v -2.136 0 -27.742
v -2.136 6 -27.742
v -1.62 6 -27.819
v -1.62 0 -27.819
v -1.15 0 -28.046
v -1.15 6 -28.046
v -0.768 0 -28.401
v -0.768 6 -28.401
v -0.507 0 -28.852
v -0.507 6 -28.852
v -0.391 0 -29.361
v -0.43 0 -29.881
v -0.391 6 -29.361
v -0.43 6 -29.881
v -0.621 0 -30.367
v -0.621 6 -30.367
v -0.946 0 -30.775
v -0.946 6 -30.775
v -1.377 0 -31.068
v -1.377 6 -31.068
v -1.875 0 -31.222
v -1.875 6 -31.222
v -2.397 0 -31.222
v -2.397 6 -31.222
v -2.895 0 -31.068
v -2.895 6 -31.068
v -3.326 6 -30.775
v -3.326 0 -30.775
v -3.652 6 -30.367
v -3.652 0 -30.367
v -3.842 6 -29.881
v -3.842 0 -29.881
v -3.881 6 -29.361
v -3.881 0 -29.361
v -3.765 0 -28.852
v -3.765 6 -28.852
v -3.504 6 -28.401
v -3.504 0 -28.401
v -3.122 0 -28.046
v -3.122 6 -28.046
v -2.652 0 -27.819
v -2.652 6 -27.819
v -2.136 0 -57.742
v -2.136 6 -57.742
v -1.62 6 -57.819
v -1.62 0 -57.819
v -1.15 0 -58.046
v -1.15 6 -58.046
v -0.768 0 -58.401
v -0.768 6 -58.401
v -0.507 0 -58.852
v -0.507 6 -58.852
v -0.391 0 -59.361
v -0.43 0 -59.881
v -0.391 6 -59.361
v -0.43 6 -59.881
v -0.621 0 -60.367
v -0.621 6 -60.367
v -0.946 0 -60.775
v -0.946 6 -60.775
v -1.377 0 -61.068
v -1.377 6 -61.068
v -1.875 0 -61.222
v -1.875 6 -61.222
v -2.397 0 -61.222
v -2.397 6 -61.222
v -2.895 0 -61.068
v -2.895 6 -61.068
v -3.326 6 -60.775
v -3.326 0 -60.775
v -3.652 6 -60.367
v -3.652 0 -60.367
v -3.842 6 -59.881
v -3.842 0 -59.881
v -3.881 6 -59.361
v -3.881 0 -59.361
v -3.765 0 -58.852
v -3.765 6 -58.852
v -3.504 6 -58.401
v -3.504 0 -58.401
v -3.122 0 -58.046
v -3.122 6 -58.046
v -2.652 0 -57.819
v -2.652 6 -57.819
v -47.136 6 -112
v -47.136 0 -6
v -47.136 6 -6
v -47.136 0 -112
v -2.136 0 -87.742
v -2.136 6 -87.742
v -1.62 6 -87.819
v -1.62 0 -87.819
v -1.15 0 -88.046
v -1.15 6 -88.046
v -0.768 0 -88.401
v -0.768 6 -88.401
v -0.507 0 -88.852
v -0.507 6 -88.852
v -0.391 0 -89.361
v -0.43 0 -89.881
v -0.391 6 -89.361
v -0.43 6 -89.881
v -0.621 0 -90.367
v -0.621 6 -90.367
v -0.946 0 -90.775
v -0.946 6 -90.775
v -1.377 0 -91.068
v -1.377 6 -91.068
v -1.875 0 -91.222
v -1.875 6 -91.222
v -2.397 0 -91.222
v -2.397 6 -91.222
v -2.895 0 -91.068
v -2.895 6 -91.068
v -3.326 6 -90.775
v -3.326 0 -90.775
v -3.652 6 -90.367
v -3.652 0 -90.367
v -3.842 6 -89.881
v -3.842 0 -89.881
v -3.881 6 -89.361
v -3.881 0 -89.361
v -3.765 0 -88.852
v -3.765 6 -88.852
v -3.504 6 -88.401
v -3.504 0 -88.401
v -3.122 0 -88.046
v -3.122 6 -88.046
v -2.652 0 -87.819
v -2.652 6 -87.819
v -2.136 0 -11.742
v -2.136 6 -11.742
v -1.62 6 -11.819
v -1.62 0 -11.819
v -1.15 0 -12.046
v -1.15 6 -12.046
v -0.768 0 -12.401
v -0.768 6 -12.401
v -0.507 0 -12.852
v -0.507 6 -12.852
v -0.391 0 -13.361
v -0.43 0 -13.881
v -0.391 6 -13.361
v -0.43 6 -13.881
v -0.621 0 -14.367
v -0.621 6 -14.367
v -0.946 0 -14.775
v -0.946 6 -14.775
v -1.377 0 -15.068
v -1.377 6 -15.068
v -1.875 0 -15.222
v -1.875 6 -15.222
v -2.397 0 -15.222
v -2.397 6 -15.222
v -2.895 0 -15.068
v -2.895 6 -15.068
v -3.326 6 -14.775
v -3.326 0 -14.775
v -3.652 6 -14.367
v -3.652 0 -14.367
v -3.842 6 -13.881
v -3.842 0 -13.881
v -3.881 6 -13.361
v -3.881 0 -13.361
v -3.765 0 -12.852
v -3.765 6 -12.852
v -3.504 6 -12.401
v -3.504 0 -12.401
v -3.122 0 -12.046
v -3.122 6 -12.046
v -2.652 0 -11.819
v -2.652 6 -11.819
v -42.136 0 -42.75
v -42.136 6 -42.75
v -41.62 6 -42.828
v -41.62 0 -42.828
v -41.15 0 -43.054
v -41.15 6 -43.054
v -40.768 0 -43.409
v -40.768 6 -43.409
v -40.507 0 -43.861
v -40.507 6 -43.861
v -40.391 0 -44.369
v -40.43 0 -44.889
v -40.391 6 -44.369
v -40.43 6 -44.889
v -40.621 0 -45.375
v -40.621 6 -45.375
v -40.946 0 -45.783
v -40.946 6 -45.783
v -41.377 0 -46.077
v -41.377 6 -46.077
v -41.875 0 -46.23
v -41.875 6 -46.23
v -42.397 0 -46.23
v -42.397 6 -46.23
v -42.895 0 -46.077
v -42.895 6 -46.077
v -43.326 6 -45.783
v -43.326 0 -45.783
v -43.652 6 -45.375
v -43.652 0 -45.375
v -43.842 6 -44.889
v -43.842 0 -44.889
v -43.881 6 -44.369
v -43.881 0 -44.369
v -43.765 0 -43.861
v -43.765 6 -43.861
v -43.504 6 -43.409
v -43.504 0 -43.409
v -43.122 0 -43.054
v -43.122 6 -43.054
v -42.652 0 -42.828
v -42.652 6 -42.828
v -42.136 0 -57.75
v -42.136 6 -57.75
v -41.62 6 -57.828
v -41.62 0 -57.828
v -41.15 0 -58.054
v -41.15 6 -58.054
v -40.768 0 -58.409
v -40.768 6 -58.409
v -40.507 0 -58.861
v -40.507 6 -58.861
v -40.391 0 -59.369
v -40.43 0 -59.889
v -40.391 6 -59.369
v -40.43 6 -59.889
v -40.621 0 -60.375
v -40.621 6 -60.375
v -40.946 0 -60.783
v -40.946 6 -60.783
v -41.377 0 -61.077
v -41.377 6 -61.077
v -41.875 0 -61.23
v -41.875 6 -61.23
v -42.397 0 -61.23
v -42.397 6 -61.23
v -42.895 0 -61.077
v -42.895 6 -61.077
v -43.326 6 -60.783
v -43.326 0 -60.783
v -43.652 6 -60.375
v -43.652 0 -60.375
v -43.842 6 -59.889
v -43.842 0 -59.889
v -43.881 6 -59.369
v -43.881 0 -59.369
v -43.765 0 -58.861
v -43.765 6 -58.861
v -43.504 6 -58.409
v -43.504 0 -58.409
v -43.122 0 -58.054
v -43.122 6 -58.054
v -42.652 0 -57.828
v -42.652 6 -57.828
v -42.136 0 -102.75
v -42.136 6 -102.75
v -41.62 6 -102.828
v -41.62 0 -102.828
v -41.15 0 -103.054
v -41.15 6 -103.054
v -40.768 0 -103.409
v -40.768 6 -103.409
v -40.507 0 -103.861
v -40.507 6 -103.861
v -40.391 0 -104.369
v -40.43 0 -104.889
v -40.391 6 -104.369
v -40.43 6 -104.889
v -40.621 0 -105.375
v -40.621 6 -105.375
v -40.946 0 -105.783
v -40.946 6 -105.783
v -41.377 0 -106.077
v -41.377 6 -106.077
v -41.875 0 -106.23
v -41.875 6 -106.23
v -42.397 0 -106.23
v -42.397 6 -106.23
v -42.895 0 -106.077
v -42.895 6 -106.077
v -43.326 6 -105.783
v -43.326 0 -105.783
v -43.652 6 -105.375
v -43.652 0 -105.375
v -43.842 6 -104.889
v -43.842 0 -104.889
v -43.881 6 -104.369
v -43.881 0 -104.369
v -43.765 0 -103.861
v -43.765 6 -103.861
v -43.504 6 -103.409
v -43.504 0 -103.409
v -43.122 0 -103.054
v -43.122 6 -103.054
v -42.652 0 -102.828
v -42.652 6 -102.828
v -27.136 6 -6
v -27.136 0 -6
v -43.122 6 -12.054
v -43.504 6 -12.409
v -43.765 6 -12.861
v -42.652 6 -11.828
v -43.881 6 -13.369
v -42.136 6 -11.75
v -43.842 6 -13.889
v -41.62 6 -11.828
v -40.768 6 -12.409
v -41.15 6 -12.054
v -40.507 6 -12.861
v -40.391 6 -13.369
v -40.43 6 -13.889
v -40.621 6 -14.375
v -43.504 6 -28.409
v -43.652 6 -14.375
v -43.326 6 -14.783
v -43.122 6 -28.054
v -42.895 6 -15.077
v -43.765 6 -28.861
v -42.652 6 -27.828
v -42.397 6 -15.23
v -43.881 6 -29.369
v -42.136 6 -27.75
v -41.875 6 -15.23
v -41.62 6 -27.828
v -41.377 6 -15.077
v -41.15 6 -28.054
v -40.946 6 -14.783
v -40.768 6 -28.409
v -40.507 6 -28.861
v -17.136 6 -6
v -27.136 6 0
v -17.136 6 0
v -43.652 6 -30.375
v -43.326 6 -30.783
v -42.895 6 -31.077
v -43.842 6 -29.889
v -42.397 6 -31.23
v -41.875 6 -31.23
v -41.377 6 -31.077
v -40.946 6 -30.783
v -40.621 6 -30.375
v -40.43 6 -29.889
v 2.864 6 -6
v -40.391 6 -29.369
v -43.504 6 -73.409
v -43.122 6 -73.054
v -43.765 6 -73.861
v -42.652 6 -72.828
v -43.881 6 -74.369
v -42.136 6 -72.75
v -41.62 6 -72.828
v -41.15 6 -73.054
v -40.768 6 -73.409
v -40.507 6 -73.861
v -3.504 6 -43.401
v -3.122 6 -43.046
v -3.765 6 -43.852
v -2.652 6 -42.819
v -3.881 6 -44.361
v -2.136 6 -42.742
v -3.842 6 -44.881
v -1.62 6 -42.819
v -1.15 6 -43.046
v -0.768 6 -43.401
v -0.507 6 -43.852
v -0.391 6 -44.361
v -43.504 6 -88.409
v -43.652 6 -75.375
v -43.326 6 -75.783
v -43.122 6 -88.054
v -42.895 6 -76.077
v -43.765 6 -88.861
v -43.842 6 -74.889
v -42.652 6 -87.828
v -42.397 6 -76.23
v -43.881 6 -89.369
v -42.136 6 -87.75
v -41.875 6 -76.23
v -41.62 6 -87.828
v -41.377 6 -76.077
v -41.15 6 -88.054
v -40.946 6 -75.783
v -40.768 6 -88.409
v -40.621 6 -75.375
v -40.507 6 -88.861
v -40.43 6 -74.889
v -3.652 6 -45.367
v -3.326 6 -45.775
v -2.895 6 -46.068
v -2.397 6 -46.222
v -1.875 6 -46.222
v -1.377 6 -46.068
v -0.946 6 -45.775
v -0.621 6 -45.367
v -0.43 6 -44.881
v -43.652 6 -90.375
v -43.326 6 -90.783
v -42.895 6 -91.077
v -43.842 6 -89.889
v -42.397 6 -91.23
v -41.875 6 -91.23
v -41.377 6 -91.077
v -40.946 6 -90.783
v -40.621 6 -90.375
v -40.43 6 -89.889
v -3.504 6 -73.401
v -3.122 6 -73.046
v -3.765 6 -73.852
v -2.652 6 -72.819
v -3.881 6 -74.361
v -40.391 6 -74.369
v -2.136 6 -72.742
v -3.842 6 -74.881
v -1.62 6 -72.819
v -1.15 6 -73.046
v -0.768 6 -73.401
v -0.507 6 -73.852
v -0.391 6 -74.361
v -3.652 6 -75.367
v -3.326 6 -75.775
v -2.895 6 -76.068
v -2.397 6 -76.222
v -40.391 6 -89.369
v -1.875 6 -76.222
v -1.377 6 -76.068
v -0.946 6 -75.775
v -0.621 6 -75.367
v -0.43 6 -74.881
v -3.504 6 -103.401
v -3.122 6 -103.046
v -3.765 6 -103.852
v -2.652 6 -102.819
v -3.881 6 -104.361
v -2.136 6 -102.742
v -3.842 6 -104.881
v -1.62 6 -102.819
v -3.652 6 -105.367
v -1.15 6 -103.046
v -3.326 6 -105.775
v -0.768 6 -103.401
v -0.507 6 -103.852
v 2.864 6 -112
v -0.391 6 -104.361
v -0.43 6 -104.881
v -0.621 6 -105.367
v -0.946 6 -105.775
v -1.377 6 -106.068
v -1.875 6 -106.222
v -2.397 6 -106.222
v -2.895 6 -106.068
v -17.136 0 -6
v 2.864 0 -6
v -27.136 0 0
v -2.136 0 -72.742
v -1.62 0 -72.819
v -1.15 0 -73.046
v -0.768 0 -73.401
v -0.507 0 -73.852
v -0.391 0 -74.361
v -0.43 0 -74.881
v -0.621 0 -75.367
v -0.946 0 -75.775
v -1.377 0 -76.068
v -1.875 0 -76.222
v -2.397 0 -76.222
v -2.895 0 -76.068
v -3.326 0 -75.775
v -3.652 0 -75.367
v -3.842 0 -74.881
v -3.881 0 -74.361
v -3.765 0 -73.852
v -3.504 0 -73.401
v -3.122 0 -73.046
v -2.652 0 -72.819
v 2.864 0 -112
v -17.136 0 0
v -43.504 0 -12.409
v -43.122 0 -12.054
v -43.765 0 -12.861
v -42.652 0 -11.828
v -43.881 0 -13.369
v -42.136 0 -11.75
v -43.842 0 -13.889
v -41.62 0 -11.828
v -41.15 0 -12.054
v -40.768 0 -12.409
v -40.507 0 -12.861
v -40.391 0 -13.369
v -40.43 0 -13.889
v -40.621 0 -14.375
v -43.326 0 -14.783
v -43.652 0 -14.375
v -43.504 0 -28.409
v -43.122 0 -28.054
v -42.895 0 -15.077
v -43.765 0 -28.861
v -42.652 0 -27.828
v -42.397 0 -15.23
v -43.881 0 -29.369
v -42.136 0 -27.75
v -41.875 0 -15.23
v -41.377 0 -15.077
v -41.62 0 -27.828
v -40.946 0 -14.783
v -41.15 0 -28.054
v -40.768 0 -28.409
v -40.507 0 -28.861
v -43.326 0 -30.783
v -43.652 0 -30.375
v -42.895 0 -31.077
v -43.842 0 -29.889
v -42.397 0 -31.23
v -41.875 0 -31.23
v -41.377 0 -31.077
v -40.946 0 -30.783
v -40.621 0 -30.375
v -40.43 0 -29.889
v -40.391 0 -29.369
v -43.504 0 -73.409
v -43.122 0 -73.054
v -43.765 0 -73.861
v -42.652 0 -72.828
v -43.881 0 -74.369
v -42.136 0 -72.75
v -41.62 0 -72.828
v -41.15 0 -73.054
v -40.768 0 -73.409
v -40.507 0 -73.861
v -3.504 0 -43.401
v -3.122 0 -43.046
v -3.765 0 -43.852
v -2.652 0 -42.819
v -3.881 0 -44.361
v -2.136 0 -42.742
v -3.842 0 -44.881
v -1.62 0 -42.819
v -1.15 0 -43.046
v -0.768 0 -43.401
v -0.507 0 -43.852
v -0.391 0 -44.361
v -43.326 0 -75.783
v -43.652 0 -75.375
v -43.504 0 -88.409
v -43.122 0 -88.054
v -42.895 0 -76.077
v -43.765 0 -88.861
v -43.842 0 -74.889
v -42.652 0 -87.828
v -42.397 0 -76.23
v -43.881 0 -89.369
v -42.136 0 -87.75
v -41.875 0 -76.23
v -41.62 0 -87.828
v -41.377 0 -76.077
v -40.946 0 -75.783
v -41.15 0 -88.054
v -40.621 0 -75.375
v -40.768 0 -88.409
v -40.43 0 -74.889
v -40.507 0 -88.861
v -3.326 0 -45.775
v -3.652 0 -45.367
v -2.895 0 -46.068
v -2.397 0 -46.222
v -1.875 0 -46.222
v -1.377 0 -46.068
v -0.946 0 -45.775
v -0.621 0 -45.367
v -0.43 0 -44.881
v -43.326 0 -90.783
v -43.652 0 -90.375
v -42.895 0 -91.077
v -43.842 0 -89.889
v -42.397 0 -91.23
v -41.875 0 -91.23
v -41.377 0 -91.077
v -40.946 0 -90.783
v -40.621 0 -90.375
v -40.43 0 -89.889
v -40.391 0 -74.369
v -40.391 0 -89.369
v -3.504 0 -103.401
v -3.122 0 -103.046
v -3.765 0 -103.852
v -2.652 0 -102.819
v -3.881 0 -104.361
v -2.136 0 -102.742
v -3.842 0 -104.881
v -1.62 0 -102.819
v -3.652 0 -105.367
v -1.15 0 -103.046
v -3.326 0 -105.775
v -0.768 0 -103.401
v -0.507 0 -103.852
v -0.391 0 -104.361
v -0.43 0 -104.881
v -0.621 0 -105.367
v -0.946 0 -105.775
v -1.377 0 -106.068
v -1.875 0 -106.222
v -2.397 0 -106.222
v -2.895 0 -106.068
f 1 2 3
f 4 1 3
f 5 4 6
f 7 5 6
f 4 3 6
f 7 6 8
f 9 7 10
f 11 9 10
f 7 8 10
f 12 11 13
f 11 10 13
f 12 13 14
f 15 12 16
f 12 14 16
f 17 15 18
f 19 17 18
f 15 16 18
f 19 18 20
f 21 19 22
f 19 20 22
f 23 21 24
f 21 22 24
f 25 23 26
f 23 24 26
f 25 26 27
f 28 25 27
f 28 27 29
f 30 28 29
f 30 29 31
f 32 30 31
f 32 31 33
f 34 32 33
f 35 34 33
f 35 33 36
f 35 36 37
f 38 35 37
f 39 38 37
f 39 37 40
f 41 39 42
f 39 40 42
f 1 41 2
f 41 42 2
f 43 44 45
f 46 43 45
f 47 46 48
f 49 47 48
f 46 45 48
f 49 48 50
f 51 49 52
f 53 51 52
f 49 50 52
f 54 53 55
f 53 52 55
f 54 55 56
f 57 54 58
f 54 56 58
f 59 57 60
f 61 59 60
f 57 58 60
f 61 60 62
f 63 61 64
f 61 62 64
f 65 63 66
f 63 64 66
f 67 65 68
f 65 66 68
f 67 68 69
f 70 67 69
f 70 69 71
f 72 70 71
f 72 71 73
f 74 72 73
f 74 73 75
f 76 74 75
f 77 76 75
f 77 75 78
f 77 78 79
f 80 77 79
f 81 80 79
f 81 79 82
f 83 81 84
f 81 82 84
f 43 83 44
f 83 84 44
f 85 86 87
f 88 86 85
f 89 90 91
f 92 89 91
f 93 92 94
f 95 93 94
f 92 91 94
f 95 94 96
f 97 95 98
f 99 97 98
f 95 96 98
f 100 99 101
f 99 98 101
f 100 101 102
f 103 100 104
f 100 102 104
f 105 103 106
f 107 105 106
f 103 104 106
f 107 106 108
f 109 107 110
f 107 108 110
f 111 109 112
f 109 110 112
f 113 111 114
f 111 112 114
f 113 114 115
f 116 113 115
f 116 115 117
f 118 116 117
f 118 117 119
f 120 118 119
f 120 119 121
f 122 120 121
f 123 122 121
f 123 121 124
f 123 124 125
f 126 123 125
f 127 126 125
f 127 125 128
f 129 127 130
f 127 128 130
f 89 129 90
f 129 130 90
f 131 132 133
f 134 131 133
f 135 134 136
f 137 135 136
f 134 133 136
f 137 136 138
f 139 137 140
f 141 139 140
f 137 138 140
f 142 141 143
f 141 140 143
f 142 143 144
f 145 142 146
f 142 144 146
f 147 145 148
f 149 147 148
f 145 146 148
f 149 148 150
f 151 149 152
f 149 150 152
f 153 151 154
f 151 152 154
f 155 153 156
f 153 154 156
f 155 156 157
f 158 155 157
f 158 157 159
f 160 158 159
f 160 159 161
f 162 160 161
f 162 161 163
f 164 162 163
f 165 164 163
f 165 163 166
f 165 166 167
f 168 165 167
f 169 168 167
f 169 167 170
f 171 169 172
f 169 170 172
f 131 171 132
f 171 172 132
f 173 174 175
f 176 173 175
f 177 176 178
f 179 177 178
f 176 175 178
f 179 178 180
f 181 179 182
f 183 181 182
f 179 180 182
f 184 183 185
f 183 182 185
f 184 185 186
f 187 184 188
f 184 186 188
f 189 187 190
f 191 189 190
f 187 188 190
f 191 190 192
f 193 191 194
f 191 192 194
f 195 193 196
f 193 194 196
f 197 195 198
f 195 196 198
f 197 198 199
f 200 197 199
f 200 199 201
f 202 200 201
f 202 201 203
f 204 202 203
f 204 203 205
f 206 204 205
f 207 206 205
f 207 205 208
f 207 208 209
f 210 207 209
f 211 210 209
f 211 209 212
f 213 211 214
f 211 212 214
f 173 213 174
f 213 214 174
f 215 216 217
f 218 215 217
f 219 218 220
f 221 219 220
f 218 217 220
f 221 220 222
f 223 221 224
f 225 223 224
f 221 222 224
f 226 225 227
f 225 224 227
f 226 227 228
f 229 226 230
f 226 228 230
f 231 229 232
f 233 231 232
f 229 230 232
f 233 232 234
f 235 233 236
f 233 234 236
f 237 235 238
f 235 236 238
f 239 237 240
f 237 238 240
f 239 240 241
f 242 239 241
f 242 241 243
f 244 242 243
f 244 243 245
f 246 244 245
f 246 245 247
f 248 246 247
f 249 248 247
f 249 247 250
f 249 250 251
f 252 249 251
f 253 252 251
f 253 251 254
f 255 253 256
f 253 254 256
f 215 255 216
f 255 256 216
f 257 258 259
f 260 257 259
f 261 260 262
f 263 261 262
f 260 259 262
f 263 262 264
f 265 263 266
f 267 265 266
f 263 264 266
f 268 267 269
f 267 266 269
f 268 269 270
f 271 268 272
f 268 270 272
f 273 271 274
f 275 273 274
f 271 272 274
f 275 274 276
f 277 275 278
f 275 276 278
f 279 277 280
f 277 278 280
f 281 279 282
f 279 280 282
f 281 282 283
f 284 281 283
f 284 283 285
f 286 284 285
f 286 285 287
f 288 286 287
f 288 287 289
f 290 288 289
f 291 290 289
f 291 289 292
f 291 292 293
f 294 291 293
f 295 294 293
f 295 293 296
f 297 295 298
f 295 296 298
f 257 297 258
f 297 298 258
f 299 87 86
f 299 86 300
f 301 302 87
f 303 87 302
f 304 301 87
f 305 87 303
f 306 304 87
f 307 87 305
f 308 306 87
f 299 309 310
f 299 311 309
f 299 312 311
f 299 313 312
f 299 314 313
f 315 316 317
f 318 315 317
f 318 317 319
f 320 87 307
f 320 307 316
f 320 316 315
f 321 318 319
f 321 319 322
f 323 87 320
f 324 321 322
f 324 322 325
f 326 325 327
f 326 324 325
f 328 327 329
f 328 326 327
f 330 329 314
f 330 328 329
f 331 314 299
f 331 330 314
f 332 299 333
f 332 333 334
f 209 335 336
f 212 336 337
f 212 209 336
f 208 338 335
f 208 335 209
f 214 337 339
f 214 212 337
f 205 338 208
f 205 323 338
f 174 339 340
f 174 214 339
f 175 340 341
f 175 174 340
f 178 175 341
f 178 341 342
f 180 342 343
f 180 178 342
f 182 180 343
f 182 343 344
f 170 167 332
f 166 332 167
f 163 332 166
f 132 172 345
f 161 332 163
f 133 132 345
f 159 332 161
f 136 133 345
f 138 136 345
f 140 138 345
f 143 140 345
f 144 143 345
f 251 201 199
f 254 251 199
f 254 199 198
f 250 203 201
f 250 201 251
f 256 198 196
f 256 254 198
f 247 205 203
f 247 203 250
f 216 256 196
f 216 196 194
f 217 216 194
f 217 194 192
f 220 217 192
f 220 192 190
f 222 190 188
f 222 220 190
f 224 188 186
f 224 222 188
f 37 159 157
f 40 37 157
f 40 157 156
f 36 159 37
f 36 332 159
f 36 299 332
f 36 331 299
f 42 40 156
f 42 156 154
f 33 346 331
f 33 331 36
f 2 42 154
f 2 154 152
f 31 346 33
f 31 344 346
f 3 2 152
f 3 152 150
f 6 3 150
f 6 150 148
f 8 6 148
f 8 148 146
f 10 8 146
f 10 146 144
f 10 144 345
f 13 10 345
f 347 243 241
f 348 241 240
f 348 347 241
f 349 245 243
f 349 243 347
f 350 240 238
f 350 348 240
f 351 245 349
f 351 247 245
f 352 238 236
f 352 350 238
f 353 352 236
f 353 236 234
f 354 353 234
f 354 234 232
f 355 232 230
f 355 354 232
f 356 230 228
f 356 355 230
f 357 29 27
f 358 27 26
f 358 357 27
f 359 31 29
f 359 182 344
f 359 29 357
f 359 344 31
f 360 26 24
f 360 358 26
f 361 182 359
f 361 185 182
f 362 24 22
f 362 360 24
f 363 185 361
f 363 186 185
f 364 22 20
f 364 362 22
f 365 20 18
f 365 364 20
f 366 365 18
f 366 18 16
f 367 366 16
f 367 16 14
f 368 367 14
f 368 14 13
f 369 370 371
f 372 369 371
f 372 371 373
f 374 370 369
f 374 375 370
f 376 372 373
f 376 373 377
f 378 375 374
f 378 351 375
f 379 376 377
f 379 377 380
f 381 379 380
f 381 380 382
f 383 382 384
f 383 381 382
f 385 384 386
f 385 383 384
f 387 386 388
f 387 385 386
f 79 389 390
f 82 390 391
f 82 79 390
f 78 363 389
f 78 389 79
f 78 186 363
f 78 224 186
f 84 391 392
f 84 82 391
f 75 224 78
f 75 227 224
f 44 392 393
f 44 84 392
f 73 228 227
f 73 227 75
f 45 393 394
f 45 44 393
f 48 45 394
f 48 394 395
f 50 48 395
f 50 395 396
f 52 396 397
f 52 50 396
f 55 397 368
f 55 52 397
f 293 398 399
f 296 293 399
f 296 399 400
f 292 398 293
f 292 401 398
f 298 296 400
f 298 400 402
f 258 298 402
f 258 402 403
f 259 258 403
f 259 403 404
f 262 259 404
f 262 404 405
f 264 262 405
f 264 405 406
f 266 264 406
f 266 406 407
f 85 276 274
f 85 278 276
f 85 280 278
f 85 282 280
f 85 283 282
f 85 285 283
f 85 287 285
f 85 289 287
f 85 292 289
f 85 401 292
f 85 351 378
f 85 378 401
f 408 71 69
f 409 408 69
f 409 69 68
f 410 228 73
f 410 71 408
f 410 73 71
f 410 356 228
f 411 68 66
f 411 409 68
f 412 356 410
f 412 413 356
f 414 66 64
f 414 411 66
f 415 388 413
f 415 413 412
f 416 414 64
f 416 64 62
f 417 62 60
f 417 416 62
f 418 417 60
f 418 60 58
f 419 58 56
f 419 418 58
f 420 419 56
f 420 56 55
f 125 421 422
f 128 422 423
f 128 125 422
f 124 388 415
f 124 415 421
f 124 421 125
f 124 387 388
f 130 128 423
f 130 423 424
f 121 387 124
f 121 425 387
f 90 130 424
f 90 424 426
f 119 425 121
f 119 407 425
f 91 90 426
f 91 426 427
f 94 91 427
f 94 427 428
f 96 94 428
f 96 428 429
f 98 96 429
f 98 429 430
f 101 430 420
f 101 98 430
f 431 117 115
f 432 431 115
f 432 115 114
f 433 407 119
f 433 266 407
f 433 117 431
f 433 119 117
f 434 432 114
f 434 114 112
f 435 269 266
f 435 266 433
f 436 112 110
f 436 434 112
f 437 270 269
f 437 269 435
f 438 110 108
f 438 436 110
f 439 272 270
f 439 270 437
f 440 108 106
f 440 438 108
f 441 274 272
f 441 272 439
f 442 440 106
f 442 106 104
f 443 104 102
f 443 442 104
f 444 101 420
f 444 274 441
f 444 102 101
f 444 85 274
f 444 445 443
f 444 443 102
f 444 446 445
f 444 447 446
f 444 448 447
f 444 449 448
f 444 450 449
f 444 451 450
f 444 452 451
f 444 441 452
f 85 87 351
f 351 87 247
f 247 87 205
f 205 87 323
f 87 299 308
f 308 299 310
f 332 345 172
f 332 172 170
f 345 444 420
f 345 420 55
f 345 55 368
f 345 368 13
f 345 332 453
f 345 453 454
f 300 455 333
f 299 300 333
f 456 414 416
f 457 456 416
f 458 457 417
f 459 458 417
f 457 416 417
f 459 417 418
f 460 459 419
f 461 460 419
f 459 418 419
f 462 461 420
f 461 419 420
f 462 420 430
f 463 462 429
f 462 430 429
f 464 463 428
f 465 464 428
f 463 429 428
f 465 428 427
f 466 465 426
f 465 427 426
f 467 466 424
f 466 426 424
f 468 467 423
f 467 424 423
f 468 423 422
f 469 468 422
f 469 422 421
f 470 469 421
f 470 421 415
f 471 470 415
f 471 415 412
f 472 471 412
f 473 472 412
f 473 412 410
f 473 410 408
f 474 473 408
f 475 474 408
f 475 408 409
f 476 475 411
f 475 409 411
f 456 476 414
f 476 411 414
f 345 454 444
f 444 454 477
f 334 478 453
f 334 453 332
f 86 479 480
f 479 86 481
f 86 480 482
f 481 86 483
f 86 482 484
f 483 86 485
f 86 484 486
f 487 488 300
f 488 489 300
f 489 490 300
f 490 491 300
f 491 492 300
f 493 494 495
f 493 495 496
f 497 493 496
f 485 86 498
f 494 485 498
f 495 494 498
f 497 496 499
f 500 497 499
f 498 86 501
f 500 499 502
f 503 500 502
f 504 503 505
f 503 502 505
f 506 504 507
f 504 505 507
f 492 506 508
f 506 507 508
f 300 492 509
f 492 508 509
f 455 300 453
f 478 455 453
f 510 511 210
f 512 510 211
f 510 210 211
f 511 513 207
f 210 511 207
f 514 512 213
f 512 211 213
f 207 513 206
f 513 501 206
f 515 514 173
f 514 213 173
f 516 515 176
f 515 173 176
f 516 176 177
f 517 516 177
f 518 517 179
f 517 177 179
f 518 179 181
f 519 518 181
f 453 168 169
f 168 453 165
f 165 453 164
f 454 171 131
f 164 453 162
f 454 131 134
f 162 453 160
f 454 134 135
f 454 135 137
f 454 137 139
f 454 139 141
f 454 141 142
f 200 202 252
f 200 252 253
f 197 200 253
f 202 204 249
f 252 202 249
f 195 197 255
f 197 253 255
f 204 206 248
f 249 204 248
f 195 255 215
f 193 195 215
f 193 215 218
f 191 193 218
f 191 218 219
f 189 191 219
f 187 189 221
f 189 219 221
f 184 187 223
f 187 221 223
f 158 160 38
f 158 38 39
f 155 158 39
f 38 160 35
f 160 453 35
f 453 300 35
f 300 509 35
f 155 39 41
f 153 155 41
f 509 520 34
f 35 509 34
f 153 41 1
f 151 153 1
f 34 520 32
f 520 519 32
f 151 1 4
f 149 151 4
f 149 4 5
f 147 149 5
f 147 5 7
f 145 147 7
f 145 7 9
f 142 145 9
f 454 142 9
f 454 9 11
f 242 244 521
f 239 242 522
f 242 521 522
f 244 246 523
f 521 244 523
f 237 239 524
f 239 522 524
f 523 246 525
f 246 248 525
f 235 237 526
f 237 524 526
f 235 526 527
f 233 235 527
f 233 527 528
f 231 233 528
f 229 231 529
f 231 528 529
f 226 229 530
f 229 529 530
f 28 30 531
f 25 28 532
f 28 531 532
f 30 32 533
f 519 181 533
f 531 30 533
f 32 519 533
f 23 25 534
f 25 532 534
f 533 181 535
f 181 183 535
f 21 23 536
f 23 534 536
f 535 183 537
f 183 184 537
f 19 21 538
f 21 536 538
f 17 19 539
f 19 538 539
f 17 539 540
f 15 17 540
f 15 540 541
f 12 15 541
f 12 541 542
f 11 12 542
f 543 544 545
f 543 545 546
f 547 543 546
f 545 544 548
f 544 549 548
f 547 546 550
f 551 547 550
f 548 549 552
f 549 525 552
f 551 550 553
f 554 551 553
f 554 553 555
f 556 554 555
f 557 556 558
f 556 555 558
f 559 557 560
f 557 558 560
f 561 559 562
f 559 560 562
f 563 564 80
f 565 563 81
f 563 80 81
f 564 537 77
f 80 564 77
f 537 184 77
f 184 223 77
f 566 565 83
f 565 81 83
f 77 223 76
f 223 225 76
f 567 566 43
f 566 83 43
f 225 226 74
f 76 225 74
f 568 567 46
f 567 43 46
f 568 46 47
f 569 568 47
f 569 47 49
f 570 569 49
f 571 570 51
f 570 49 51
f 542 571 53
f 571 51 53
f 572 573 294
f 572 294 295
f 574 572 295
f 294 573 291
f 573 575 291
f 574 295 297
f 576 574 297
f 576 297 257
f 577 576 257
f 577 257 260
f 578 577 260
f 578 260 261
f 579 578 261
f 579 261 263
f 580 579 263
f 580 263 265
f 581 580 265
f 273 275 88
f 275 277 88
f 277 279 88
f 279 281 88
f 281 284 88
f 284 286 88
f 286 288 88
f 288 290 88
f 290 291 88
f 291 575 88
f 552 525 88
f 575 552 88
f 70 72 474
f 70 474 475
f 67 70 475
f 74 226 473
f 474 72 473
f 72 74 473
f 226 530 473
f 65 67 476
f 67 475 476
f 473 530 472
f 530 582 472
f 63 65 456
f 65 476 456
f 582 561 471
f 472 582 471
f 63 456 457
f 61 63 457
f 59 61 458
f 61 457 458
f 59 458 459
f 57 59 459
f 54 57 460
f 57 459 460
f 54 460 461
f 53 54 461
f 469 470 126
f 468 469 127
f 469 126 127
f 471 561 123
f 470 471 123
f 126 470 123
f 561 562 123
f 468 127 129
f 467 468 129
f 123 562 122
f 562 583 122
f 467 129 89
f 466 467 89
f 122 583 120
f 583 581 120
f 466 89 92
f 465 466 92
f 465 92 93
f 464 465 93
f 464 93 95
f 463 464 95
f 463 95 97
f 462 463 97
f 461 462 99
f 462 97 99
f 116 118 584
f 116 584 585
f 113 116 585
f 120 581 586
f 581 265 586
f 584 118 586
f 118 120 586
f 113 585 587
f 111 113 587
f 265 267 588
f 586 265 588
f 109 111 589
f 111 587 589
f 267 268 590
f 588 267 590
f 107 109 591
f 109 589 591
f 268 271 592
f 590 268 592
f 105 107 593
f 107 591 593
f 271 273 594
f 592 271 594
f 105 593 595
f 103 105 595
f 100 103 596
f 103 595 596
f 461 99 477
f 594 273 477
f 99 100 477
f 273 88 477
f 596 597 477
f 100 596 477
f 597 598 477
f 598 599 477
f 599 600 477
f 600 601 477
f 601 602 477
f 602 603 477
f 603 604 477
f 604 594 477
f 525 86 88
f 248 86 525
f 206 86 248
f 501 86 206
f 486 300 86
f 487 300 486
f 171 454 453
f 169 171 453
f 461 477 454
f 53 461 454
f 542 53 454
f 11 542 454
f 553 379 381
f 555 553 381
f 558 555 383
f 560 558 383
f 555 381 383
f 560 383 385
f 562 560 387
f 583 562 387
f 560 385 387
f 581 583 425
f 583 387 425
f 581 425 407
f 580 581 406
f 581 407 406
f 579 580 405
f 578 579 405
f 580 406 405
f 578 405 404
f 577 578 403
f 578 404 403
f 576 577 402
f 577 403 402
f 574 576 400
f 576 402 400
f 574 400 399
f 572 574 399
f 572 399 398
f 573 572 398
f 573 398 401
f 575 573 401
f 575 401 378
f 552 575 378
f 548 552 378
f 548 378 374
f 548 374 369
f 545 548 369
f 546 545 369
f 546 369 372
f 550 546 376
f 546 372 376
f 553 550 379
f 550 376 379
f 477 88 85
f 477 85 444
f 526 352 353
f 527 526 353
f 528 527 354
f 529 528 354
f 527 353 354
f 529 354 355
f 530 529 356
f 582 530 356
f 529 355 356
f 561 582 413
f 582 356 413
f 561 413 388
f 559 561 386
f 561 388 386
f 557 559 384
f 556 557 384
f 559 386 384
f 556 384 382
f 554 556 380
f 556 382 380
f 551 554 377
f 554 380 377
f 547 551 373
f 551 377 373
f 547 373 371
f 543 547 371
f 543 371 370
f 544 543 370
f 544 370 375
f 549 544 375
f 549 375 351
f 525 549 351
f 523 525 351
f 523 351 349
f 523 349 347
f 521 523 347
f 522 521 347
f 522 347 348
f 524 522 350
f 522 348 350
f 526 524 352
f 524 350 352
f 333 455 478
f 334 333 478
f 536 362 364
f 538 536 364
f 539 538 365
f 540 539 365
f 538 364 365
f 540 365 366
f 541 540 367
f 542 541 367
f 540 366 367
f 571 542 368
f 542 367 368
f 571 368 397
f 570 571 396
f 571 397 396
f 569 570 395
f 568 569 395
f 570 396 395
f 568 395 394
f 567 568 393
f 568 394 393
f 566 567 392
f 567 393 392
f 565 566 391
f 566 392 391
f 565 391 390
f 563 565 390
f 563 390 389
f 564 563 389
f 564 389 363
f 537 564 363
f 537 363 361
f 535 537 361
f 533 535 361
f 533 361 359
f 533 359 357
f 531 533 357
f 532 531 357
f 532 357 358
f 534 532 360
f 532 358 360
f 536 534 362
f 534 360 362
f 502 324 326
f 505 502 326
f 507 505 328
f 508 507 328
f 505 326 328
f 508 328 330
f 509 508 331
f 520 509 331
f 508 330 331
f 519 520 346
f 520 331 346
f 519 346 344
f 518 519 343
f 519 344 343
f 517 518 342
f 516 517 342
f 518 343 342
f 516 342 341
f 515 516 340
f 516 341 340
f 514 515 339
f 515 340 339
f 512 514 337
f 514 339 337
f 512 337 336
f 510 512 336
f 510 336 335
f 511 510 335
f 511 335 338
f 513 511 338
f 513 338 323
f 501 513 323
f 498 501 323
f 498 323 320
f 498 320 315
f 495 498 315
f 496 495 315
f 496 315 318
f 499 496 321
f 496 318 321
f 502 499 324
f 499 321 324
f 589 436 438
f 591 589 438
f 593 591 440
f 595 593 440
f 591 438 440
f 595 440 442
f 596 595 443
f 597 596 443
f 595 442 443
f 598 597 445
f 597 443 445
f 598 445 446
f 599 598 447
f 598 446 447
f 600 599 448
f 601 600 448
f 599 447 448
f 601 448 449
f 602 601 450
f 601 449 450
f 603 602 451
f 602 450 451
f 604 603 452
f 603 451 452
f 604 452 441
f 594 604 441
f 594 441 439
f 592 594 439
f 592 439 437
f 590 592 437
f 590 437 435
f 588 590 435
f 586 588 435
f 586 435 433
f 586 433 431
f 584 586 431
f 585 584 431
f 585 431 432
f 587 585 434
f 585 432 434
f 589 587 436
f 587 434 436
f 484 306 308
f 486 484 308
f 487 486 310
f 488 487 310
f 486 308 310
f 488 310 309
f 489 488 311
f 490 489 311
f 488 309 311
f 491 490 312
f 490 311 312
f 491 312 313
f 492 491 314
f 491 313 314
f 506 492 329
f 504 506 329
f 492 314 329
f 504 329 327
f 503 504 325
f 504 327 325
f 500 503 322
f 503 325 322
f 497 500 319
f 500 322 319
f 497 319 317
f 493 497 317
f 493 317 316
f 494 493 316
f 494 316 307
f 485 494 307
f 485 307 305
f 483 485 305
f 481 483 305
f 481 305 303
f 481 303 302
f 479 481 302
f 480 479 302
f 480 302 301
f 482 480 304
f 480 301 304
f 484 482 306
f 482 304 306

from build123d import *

# Parameters (mm, degrees)
ESBO_O1_W                = 50
ESBO_O1_H                = 112
RESSALTO_EXTRUS_O1_DEPTH = 6
ESBO_O2_W                = 20
ESBO_O2_H                = 6
CORTE_EXTRUS_O1_DEPTH    = 6
ESBO_O5_R                = 1.75
CORTE_EXTRUS_O3_DEPTH    = 6


with BuildPart() as part:
    # Esboço1 → Ressalto-extrusão1 (new body)
    with BuildSketch(Plane(origin=(0, 0, 0), x_dir=(1, 0, 0), z_dir=(0, 1, 0))):
        with Locations((-22.136094675, 56)):
            Rectangle(ESBO_O1_W, ESBO_O1_H)
    extrude(amount=RESSALTO_EXTRUS_O1_DEPTH)

    # Esboço2 → Corte-extrusão1 (cut)
    with BuildSketch(Plane.XY):
        with Locations((-37.136094675, 3)):
            Rectangle(ESBO_O2_W, ESBO_O2_H)
        with Locations((-7.136094675, 3)):
            Rectangle(ESBO_O2_W, ESBO_O2_H)
    extrude(amount=-CORTE_EXTRUS_O1_DEPTH, mode=Mode.SUBTRACT)

    # Esboço5 → Corte-extrusão3 (cut)
    with BuildSketch(Plane(origin=(0, 6, 0), x_dir=(1, 0, 0), z_dir=(0, 1, 0))):
        with Locations(Location((-42.136094675, 104.5, 0), (0, 0, 270))):
            Circle(ESBO_O5_R)
        with Locations(Location((-42.136094675, 89.5, 0), (0, 0, 270))):
            Circle(ESBO_O5_R)
        with Locations(Location((-42.136094675, 74.5, 0), (0, 0, 270))):
            Circle(ESBO_O5_R)
        with Locations(Location((-42.136094675, 59.5, 0), (0, 0, 270))):
            Circle(ESBO_O5_R)
        with Locations(Location((-42.136094675, 44.5, 0), (0, 0, 270))):
            Circle(ESBO_O5_R)
        with Locations(Location((-42.136094675, 13.5, 0), (0, 0, 270))):
            Circle(ESBO_O5_R)
        with Locations(Location((-42.136094675, 29.5, 0), (0, 0, 270))):
            Circle(ESBO_O5_R)
        with Locations(Location((-2.136094675, 104.491725396, 0), (0, 0, 270))):
            Circle(ESBO_O5_R)
        with Locations(Location((-2.136094675, 89.491725396, 0), (0, 0, 270))):
            Circle(ESBO_O5_R)
        with Locations(Location((-2.136094675, 74.491725396, 0), (0, 0, 270))):
            Circle(ESBO_O5_R)
        with Locations(Location((-2.136094675, 59.491725396, 0), (0, 0, 270))):
            Circle(ESBO_O5_R)
        with Locations(Location((-2.136094675, 44.491725396, 0), (0, 0, 270))):
            Circle(ESBO_O5_R)
        with Locations(Location((-2.136094675, 13.491725396, 0), (0, 0, 270))):
            Circle(ESBO_O5_R)
        with Locations(Location((-2.136094675, 29.491725396, 0), (0, 0, 270))):
            Circle(ESBO_O5_R)
    extrude(amount=-CORTE_EXTRUS_O3_DEPTH, mode=Mode.SUBTRACT)


solid = part.part
